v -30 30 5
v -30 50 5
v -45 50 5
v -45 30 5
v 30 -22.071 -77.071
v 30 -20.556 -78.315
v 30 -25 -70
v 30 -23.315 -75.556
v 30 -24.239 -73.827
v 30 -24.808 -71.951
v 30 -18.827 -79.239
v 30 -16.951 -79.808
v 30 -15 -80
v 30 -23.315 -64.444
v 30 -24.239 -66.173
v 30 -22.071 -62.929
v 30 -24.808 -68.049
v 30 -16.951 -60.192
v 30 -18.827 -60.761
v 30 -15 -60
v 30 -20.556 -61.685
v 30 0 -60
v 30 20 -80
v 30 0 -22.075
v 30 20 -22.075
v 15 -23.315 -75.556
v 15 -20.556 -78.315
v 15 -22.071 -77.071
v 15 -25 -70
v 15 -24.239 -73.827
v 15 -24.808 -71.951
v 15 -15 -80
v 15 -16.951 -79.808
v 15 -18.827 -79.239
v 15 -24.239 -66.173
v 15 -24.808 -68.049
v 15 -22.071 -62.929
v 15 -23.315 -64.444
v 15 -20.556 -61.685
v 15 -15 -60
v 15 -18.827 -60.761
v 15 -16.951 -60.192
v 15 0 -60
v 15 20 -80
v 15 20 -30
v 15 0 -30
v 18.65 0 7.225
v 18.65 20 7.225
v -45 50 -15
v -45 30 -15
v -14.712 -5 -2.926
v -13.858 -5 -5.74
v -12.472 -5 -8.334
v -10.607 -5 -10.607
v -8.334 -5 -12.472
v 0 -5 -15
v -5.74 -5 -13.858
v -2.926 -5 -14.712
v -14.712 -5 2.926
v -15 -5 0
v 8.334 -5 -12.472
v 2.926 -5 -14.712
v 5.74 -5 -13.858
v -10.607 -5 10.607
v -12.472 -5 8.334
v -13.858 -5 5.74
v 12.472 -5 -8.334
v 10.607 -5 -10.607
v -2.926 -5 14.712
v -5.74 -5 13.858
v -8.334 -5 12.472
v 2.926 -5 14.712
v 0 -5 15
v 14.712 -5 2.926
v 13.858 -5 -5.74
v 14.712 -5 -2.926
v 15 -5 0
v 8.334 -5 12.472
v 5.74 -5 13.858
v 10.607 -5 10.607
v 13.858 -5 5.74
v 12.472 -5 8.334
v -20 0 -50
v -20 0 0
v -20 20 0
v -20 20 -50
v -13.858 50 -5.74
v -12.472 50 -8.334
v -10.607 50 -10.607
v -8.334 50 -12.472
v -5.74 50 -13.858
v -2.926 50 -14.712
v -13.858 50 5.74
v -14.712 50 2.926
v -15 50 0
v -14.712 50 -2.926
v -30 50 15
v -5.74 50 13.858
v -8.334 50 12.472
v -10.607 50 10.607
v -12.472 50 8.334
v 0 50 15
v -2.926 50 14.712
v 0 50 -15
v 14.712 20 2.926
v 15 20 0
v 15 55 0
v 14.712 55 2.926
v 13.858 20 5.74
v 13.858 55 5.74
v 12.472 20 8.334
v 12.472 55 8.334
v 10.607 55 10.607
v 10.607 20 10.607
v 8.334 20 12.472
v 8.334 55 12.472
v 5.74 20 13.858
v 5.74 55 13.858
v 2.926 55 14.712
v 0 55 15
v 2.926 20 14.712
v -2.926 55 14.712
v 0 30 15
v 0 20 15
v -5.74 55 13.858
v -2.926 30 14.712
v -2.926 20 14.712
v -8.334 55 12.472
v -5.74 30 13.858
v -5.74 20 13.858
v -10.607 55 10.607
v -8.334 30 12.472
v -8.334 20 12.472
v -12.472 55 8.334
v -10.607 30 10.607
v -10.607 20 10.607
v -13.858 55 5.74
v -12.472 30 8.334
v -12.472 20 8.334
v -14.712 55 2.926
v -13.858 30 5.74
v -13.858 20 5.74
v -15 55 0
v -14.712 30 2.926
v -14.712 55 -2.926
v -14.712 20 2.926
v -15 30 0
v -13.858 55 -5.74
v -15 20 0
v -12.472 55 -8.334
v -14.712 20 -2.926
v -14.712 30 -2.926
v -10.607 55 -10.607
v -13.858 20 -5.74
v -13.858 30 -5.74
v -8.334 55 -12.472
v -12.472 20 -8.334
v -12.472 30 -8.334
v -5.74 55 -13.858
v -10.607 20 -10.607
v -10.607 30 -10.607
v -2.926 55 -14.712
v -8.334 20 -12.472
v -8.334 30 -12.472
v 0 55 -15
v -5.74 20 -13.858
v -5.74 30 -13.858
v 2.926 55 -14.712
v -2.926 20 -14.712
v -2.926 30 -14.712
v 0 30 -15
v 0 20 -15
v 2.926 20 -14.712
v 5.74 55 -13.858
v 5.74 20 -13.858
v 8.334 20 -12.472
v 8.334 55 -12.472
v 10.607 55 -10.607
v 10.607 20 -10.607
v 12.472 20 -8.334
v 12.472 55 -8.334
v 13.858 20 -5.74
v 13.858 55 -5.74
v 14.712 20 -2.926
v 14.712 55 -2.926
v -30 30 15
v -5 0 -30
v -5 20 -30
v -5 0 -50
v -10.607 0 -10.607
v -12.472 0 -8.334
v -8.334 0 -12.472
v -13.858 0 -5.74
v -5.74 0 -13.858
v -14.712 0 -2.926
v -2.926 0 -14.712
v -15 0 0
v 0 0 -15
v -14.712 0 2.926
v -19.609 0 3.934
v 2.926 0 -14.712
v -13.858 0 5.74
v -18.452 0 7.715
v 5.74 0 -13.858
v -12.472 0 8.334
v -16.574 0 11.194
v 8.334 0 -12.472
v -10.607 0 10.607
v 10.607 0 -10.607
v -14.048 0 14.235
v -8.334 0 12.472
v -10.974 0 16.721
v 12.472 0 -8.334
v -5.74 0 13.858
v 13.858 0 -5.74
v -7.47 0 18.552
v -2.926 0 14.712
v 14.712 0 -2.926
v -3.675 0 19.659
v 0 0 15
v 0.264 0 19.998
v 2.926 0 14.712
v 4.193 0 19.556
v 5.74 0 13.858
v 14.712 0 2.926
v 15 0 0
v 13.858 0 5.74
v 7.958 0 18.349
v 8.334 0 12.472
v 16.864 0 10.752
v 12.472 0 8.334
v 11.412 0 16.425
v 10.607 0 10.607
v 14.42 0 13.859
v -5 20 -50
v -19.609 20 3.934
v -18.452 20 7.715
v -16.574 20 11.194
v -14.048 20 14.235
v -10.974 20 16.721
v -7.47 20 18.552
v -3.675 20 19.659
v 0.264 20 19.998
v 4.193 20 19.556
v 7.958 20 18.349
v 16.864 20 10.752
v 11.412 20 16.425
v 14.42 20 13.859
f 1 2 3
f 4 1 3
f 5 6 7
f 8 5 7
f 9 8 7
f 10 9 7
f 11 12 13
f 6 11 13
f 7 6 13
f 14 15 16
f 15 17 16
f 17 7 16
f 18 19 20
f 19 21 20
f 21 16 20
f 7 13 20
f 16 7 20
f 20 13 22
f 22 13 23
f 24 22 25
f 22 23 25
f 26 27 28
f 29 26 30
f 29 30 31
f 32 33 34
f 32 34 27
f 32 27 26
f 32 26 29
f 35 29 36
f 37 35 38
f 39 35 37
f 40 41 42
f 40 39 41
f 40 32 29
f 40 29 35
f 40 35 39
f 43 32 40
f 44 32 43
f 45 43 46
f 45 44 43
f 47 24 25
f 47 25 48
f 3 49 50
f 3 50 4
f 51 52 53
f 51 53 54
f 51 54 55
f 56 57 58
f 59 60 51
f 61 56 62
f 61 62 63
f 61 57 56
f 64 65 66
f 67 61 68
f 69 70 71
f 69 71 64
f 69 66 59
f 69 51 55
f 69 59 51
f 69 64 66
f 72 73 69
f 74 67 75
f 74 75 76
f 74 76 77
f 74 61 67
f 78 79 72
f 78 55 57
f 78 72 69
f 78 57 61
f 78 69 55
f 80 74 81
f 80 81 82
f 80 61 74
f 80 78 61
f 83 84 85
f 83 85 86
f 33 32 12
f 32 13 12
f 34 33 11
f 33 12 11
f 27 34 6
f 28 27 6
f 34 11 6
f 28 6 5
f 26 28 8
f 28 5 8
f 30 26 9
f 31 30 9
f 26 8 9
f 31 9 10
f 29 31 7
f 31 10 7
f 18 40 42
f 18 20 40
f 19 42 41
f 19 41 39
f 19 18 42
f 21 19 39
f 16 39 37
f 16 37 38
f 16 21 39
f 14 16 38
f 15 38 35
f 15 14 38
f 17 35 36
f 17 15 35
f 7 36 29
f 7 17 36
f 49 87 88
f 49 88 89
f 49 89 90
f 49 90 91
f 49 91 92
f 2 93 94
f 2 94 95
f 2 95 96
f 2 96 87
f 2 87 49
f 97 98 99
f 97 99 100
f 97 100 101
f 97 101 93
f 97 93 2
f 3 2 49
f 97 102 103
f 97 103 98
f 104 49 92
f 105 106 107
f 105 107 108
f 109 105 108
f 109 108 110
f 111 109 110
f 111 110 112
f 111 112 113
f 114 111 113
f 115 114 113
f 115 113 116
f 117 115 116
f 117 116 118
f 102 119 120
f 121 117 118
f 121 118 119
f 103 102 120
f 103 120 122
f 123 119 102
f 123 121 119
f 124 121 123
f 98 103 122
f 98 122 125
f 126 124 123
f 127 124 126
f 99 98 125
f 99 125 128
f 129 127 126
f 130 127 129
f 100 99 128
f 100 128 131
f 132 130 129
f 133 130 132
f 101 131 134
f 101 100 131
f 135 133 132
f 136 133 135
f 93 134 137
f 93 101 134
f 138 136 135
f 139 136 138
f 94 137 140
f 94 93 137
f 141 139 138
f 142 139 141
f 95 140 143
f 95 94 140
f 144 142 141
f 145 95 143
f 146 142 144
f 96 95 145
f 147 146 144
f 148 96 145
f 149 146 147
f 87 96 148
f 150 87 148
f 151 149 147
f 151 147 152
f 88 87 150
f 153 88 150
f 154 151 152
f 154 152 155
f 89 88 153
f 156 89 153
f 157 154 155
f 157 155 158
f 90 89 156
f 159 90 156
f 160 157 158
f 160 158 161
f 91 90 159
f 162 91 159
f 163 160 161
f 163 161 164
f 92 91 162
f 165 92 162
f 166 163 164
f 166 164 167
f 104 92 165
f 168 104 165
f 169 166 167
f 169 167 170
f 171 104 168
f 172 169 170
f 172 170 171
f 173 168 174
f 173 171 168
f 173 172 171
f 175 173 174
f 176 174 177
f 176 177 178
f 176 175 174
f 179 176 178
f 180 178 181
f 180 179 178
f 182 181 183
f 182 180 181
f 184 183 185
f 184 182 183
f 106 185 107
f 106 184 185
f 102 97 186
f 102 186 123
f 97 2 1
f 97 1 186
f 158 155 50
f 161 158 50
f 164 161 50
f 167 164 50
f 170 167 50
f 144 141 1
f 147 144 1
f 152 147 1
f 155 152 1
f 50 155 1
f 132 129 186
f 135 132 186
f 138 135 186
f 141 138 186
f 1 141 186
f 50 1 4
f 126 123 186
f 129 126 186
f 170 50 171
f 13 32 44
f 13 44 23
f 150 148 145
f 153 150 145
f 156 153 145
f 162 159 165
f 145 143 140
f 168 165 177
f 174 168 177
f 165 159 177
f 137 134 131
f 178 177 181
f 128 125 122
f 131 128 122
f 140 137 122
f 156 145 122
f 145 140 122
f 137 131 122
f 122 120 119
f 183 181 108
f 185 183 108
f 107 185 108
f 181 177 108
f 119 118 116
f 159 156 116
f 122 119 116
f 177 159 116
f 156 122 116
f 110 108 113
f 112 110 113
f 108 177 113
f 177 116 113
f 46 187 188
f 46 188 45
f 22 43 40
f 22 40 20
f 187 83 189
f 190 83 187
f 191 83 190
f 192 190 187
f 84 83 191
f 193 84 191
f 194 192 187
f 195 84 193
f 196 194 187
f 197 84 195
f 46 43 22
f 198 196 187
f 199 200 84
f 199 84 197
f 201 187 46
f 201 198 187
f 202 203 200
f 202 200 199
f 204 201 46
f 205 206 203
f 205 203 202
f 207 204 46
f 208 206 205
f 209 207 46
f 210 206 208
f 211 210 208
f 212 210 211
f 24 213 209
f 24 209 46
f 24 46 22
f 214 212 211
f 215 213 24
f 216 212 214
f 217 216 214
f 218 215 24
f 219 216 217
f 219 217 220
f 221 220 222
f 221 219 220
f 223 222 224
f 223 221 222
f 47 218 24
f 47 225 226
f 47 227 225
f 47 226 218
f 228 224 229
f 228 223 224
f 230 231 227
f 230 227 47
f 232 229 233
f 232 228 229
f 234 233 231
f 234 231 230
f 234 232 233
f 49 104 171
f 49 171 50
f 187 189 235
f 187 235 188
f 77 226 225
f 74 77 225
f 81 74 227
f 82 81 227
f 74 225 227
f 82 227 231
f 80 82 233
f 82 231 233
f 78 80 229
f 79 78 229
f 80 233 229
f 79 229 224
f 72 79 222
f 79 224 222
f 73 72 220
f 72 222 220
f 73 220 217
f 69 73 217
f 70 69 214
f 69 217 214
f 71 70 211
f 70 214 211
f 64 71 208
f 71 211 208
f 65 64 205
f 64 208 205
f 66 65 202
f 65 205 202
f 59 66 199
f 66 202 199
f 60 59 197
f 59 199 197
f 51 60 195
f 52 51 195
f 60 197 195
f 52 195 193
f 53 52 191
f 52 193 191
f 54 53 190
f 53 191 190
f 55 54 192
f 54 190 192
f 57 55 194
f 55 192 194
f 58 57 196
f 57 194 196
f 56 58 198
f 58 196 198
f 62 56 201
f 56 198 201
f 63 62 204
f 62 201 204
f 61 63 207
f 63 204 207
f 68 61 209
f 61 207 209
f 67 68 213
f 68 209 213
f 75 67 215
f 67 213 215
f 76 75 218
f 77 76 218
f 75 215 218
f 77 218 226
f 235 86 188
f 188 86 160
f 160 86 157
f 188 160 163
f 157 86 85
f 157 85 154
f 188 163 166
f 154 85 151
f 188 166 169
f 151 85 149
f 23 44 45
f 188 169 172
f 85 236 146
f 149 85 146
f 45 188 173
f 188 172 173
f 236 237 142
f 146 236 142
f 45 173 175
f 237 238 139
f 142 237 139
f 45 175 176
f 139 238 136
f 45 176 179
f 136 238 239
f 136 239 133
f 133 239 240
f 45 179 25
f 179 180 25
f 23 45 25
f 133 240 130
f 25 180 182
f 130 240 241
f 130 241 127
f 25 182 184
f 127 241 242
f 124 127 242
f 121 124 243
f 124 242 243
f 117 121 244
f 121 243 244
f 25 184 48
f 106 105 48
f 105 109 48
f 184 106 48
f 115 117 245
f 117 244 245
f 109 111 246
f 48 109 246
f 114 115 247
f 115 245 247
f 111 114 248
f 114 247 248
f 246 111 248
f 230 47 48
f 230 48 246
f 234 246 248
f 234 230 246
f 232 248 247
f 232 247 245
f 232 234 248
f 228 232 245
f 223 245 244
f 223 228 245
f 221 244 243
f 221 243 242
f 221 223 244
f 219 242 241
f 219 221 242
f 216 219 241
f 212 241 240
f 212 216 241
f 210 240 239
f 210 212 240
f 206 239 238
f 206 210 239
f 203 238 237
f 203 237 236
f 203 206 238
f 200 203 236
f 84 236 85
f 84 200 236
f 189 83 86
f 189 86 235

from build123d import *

# Parameters (mm, degrees)
F1_DEPTH      = 20
F2_R          = 15
F3_DEPTH      = 5
F3_DEPTH_BACK = 55
F4_W          = 15
F4_H          = 20
F5_DEPTH      = 25
F6_R          = 9.99999
F7_W          = 15
F7_H          = 10
F8_DEPTH      = 25
F9_DEPTH      = 25
F10_DEPTH     = 5


# Not quite as in the source:
# - a fillet or chamfer is up to 0.001 mm smaller than in the source, because OpenCascade refuses the exact size


with BuildPart() as f1:
    # F0 (on Front) → F1 (new body)
    with BuildSketch(Plane.XZ):
        with BuildLine():
            ThreePointArc((18.649535318, 7.2245991185), (19.659485069, 3.6748669119), (20, 0))
            ThreePointArc((20, 0), (0, -20), (-20, 0))
            Line((-20, 0), (-20, -50))
            Line((-20, -50), (-5, -50))
            Line((-5, -50), (-5, -30))
            Line((-5, -30), (15, -30))
            Line((15, -30), (15, -80))
            Line((15, -80), (30, -80))
            Line((30, -80), (30, -22.0754199539))
            Line((30, -22.0754199539), (18.649535318, 7.2245991185))
        make_face()
        with BuildLine():
            ThreePointArc((-20, 0), (0, -20), (20, 0))
            ThreePointArc((20, 0), (19.659485069, 3.6748669119), (18.649535318, 7.2245991185))
            ThreePointArc((18.649535318, 7.2245991185), (-3.6748669119, 19.659485069), (-20, 0))
        make_face()
    extrude(amount=-F1_DEPTH)

    # F2 (on face) → F3 (join, two sides)
    with BuildSketch(Plane.XZ) as f3_sk:
        Circle(F2_R)
    extrude(amount=F3_DEPTH)
    extrude(f3_sk.sketch, amount=-F3_DEPTH_BACK)

    # F4 (on face) → F5 (join)
    with BuildSketch(Plane.XZ):
        with Locations((22.5, -70)):
            Rectangle(F4_W, F4_H)
    extrude(amount=F5_DEPTH)

    # F6 (radius 10 in the source; OpenCascade refuses exactly that, so slightly less here)
    f6_edges = [f1.edges().sort_by_distance(p)[0] for p in [
        (22.5, -25, -60),
        (22.5, -25, -80),
    ]]
    fillet(f6_edges, radius=F6_R)

    # F7 (on face) → F8 (join)
    with BuildSketch(Plane(origin=(0, 55, 0), x_dir=(-1, 0, 0), z_dir=(0, 1, 0))):
        with Locations((37.5, 10)):
            Rectangle(F7_W, F7_H)
        with BuildLine():
            Line((30, 15), (0, 15))
            ThreePointArc((0, 15), (10.6066017178, 10.6066017178), (15, 0))
            ThreePointArc((15, 0), (10.6066017178, -10.6066017178), (0, -15))
            Line((0, -15), (45, -15))
            Line((45, -15), (45, 5))
            Line((45, 5), (30, 5))
            Line((30, 5), (30, 15))
        make_face()
    extrude(amount=-F8_DEPTH)

    # F7 (on face) → F9 (cut)
    with BuildSketch(Plane(origin=(0, 55, 0), x_dir=(-1, 0, 0), z_dir=(0, 1, 0))):
        with Locations((37.5, 10)):
            Rectangle(F7_W, F7_H)
    extrude(amount=-F9_DEPTH, mode=Mode.SUBTRACT)

    # F7 (on face) → F10 (cut)
    with BuildSketch(Plane(origin=(0, 55, 0), x_dir=(-1, 0, 0), z_dir=(0, 1, 0))):
        with Locations((37.5, 10)):
            Rectangle(F7_W, F7_H)
        with BuildLine():
            Line((30, 15), (0, 15))
            ThreePointArc((0, 15), (10.6066017178, 10.6066017178), (15, 0))
            ThreePointArc((15, 0), (10.6066017178, -10.6066017178), (0, -15))
            Line((0, -15), (45, -15))
            Line((45, -15), (45, 5))
            Line((45, 5), (30, 5))
            Line((30, 5), (30, 15))
        make_face()
    extrude(amount=-F10_DEPTH, mode=Mode.SUBTRACT)


solid = f1.part
